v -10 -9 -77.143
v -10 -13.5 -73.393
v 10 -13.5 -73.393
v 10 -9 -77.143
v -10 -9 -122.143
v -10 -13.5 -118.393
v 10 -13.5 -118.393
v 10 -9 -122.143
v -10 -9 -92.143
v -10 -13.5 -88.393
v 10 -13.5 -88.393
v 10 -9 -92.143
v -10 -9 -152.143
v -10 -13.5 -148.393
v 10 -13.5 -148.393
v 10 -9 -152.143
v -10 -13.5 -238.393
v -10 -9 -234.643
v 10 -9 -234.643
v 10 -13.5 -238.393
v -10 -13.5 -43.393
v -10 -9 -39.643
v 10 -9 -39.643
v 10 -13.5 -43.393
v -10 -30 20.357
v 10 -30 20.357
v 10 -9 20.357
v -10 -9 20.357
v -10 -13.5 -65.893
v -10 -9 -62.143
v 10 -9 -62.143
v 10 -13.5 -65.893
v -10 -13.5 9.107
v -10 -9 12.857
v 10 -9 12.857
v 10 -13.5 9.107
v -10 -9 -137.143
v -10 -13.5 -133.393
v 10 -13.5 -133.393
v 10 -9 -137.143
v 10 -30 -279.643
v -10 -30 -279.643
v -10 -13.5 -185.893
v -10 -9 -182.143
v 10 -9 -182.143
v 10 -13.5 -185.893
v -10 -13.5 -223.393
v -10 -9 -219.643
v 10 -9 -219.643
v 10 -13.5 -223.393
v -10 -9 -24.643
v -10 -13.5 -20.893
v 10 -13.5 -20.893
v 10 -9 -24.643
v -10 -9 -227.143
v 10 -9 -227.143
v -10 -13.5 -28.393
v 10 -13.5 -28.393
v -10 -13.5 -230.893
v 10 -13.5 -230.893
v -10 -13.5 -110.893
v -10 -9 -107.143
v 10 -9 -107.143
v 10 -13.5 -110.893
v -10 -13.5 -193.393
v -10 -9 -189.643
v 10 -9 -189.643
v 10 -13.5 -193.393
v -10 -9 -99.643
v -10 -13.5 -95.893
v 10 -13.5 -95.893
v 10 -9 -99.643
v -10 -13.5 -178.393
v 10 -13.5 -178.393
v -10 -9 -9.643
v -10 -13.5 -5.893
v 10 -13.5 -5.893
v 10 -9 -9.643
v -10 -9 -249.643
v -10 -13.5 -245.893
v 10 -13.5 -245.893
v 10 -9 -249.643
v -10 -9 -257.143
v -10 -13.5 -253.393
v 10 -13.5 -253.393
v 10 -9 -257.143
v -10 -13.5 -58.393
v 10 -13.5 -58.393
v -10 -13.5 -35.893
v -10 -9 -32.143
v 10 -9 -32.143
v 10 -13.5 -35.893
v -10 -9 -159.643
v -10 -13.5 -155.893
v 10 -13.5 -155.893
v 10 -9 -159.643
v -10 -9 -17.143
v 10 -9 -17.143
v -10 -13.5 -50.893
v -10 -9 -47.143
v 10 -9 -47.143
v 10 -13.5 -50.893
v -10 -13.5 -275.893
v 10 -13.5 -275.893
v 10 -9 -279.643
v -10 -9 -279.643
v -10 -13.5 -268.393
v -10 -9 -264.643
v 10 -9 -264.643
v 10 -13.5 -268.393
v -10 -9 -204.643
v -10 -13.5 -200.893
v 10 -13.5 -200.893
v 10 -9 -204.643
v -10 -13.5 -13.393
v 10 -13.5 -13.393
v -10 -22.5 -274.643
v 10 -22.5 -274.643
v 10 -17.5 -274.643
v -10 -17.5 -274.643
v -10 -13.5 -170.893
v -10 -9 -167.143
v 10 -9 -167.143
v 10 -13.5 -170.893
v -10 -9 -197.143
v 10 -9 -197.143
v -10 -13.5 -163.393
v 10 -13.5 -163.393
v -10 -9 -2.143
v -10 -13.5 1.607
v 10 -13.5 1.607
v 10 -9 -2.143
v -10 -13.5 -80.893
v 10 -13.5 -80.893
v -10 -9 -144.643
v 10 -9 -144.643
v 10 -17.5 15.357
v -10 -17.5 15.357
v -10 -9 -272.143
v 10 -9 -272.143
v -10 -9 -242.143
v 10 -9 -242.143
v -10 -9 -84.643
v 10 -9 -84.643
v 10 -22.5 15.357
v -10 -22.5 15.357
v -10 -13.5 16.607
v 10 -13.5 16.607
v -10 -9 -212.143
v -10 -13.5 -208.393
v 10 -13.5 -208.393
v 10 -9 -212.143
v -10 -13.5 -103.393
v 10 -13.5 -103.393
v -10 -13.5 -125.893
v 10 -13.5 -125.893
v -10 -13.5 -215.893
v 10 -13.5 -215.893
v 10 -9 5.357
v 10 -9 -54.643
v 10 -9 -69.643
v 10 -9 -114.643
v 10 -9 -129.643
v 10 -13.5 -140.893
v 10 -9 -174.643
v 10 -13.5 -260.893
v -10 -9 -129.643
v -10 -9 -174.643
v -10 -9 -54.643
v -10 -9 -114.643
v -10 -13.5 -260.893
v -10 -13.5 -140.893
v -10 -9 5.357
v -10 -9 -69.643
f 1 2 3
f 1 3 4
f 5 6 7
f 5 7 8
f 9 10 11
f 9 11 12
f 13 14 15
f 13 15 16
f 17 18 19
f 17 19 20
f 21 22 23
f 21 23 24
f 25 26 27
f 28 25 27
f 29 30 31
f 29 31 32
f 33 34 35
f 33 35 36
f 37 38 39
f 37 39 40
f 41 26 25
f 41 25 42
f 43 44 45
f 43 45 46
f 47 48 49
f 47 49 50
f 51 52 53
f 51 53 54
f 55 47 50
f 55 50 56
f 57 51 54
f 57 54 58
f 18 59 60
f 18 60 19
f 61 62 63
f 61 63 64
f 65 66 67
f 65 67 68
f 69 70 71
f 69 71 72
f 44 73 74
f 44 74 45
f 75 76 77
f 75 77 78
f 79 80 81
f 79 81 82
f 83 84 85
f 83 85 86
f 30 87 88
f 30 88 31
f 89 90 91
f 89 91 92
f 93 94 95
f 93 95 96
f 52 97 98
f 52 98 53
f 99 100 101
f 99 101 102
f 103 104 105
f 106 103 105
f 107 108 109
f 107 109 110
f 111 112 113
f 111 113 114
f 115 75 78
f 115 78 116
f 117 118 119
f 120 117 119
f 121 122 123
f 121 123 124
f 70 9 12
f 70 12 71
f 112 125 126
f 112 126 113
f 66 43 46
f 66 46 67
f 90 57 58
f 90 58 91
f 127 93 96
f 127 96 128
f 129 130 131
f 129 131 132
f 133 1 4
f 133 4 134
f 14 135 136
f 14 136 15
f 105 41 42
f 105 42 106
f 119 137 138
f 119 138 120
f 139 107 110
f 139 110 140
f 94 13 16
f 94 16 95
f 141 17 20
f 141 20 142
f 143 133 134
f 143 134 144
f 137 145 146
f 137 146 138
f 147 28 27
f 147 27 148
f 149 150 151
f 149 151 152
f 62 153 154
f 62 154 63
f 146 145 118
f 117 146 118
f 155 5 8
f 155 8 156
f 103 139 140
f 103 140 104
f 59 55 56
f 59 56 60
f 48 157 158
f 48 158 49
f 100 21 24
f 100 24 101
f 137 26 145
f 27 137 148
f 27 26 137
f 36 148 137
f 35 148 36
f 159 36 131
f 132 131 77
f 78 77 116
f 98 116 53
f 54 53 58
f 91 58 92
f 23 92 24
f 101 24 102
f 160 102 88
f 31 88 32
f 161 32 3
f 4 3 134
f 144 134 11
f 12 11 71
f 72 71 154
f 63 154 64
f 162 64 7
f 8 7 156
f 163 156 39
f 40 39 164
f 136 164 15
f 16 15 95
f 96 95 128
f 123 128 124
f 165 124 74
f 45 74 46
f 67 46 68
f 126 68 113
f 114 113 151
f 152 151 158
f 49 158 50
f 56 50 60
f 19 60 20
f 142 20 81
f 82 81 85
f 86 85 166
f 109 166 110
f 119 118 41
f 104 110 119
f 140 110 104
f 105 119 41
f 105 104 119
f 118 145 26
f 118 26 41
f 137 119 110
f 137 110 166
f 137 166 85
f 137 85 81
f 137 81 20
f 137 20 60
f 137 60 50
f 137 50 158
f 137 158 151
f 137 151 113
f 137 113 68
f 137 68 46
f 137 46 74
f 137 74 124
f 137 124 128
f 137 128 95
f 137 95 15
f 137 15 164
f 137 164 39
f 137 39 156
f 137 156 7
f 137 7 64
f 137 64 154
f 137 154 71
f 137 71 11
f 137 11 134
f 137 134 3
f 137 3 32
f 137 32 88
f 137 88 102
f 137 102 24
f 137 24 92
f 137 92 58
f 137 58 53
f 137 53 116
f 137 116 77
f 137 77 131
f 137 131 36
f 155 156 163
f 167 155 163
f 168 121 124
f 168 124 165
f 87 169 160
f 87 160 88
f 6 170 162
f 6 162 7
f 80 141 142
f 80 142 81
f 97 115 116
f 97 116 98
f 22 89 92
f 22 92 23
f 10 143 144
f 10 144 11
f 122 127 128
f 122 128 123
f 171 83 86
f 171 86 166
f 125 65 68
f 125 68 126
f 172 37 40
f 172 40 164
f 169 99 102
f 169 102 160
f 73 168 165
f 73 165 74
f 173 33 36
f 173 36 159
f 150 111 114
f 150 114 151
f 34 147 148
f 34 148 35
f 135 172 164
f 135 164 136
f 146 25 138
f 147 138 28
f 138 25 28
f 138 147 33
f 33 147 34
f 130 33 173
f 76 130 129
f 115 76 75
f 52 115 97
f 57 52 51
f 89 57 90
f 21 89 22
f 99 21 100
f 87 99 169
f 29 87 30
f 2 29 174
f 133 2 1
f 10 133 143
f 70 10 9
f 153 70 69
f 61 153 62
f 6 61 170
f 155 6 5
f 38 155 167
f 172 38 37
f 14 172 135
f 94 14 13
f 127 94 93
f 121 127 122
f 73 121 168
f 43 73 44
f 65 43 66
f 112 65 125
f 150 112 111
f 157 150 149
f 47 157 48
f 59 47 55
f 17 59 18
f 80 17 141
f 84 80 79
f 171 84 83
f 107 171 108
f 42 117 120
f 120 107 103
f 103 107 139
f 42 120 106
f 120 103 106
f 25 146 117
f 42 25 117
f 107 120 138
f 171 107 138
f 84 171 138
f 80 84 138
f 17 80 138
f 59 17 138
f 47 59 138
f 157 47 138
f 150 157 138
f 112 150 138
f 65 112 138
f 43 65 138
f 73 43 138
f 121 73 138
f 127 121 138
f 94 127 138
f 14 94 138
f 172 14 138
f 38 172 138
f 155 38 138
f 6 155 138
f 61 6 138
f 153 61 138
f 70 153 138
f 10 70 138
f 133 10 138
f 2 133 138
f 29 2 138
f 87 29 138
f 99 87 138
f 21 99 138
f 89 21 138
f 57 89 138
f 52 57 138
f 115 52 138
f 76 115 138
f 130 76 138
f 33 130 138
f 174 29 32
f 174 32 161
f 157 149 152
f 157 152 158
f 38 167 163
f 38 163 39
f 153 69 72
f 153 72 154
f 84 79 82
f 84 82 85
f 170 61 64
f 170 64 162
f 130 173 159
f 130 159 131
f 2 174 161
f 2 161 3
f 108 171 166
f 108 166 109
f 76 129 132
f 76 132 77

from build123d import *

# Parameters (mm, degrees)
SKETCH2_W                = 300
SKETCH2_H                = 21
BOSS_EXTRUDE2_DEPTH      = 10
BOSS_EXTRUDE2_DEPTH_BACK = 10
CUT_EXTRUDE1_DEPTH       = 20
LPATTERN1_COUNT          = 40
LPATTERN1_PITCH          = 7.5
SKETCH4_W                = 290
SKETCH4_H                = 5
CUT_EXTRUDE2_DEPTH       = 20


with BuildPart() as part:
    # Sketch2 → Boss-Extrude2 (new body, two sides)
    with BuildSketch(Plane(origin=(0, 0, 0), x_dir=(0, 0, -1), z_dir=(1, 0, 0))) as boss_extrude2_sk:
        with Locations((129.642857143, -19.5)):
            Rectangle(SKETCH2_W, SKETCH2_H)
    extrude(amount=BOSS_EXTRUDE2_DEPTH)
    extrude(boss_extrude2_sk.sketch, amount=-BOSS_EXTRUDE2_DEPTH_BACK)

    # Sketch3 → Cut-Extrude1 (cut)
    with BuildSketch(Plane(origin=(10, 0, 0), x_dir=(0, 0, -1), z_dir=(1, 0, 0))):
        Polygon((-20.357142857, -9), (-16.607142857, -13.5), (-12.857142857, -9), align=None)
    cut_extrude1 = extrude(amount=-CUT_EXTRUDE1_DEPTH, mode=Mode.SUBTRACT)

    # LPattern1: Cut-Extrude1 ×40
    with Locations(*[(0, 0, -i * LPATTERN1_PITCH) for i in range(1, LPATTERN1_COUNT)]):
        add(cut_extrude1, mode=Mode.SUBTRACT)

    # Sketch4 → Cut-Extrude2 (cut)
    with BuildSketch(Plane(origin=(10, 0, 0), x_dir=(0, 0, -1), z_dir=(1, 0, 0))):
        with Locations((129.642857143, -20)):
            Rectangle(SKETCH4_W, SKETCH4_H)
    extrude(amount=-CUT_EXTRUDE2_DEPTH, mode=Mode.SUBTRACT)


solid = part.part
